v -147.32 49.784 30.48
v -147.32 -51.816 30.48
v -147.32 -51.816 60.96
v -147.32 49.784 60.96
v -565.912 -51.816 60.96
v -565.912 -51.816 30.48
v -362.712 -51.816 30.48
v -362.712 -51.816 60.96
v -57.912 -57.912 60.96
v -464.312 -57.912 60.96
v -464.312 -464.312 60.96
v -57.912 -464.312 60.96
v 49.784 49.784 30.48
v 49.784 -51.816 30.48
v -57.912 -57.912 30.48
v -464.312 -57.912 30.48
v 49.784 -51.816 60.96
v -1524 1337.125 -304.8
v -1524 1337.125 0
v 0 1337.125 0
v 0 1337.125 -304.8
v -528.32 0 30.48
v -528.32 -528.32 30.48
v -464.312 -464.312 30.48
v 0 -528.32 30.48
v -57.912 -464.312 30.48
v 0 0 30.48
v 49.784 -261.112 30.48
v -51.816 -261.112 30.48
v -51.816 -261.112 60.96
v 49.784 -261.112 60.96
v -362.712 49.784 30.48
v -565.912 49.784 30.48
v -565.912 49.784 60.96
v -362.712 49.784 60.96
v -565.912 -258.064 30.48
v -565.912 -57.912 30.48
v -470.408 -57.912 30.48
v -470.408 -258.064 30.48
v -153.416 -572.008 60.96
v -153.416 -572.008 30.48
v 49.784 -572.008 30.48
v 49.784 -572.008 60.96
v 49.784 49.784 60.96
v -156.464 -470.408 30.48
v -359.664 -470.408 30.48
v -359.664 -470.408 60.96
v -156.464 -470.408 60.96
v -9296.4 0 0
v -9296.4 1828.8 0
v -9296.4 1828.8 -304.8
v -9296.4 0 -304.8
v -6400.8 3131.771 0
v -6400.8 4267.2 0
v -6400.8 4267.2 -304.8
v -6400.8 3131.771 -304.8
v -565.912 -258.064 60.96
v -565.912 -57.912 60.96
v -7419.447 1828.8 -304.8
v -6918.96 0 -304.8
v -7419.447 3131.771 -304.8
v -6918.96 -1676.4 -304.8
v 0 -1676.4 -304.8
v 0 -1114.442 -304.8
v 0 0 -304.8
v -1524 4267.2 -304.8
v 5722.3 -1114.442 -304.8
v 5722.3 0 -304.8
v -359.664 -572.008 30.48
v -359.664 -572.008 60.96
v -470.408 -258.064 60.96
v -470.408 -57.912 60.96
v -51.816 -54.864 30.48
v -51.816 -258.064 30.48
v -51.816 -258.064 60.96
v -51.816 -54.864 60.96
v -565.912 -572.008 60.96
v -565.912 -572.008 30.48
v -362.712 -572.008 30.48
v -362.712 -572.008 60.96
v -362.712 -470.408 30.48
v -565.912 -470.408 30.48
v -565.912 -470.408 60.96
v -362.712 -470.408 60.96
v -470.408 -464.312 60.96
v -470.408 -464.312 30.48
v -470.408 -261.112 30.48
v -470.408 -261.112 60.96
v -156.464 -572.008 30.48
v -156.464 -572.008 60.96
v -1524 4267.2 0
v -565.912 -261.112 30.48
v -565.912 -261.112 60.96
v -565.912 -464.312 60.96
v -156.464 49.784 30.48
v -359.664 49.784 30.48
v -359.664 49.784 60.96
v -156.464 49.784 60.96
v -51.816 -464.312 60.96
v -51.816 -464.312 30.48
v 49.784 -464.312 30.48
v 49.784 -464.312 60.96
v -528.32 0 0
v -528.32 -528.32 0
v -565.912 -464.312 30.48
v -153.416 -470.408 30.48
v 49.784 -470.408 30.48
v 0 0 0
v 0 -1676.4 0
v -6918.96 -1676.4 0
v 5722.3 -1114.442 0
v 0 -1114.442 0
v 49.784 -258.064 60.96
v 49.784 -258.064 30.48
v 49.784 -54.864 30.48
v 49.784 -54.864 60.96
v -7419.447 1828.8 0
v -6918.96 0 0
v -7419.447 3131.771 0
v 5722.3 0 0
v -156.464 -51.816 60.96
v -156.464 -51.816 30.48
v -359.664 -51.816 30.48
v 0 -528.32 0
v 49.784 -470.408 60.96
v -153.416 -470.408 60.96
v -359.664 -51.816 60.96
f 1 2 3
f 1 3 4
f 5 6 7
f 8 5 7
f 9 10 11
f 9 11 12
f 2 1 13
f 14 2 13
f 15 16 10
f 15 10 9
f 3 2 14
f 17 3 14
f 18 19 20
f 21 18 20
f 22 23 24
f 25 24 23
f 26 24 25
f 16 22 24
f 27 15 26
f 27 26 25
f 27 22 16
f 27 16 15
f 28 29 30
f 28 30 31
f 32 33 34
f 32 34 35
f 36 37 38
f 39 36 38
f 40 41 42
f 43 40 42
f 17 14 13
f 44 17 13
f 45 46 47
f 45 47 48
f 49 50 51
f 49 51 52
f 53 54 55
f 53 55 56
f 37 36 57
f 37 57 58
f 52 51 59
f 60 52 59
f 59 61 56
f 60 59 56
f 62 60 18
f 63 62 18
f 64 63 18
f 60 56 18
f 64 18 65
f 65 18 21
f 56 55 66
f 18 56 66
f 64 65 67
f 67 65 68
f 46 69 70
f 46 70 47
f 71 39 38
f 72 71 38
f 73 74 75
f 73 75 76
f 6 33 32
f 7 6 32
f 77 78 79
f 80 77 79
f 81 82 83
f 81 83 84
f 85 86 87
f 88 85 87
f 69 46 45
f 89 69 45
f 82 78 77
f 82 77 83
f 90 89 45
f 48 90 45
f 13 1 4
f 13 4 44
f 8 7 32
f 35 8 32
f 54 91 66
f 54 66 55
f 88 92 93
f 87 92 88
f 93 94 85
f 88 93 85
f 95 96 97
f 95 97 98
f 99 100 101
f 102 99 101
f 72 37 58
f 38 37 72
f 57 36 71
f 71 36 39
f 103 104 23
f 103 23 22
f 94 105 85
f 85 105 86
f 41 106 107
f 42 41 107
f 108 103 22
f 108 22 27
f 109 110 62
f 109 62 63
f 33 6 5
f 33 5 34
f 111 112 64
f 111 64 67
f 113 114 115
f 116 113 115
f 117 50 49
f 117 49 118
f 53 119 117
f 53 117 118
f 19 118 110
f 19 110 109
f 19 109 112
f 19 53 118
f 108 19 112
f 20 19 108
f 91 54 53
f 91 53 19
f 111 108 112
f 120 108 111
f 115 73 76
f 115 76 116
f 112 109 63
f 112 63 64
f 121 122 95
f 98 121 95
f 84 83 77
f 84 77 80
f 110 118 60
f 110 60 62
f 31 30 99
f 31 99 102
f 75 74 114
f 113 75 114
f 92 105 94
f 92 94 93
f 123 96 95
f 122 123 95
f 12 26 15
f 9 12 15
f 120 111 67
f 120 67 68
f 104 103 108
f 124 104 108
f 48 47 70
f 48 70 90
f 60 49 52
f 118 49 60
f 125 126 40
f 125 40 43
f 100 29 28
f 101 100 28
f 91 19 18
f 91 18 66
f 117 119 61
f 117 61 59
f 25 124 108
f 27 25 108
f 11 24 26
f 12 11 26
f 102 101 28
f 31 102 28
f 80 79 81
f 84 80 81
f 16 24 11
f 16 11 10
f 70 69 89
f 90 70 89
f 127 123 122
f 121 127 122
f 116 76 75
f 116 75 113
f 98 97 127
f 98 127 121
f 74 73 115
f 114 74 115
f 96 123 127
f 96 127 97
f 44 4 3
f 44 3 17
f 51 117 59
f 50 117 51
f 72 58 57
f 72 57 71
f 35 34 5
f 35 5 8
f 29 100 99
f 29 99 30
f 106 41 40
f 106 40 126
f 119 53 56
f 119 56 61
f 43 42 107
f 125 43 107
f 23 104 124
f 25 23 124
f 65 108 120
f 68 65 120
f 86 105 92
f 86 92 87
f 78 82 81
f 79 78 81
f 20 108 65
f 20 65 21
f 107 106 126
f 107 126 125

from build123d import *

# Parameters (mm, degrees)
F0_W     = 1524
F0_H     = 1337.124705
F0_W_2   = 5722.299576
F0_H_2   = 1114.441872
F1_DEPTH = 304.8
F2_W     = 528.32
F2_H     = 528.32
F3_DEPTH = 30.48
F4_W     = 406.4
F4_H     = 406.4
F5_DEPTH = 30.48
F6_W     = 203.2
F6_H     = 101.6
F6_W_2   = 101.6
F6_H_2   = 203.2
F6_W_3   = 197.104
F6_W_4   = 95.504
F6_H_3   = 200.152
F7_DEPTH = 30.48


with BuildPart() as f1:
    # F0 (on Top) → F1 (new body)
    with BuildSketch(Plane.XY):
        Polygon((-9296.4, 0), (-6918.96, 0), (-1524, 0), (-1524, 1337.124705), (-1524, 4267.2), (-6400.8, 4267.2), (-6400.8, 3131.770648), (-7419.447352, 3131.770648), (-7419.447352, 1828.8), (-9296.4, 1828.8), align=None)
        Polygon((-1524, 0), (-6918.96, 0), (-6918.96, -1676.4), (0, -1676.4), (0, -1114.441872), (0, 0), align=None)
        with Locations((-762, 668.562352)):
            Rectangle(F0_W, F0_H)
        with Locations((2861.149788, -557.220936)):
            Rectangle(F0_W_2, F0_H_2)
    extrude(amount=-F1_DEPTH)


with BuildPart() as f3:
    # F2 (on Top) → F3 (new body)
    with BuildSketch(Plane.XY):
        with Locations((-264.16, -264.16)):
            Rectangle(F2_W, F2_H)
    extrude(amount=F3_DEPTH)

    # F4 (on face) → F5 (join)
    with BuildSketch(Plane.XY.offset(30.48)):
        with Locations((-261.112, -261.112)):
            Rectangle(F4_W, F4_H)
    extrude(amount=F5_DEPTH)


with BuildPart() as f7:
    # F6 (on face) → F7 (new body)
    with BuildSketch(Plane.XY.offset(30.48)):
        with Locations((-51.816, -521.208)):
            Rectangle(F6_W, F6_H)
        with Locations((-258.064, -521.208)):
            Rectangle(F6_W, F6_H)
        with Locations((-1.016, -362.712)):
            Rectangle(F6_W_2, F6_H_2)
        with Locations((-1.016, -156.464)):
            Rectangle(F6_W_2, F6_H_2)
        with Locations((-464.312, -521.208)):
            Rectangle(F6_W, F6_H)
        with Locations((-48.768, -1.016)):
            Rectangle(F6_W_3, F6_H)
        with Locations((-258.064, -1.016)):
            Rectangle(F6_W, F6_H)
        with Locations((-518.16, -362.712)):
            Rectangle(F6_W_4, F6_H_2)
        with Locations((-518.16, -157.988)):
            Rectangle(F6_W_4, F6_H_3)
        with Locations((-464.312, -1.016)):
            Rectangle(F6_W, F6_H)
    extrude(amount=F7_DEPTH)


solid = Compound([f1.part, f3.part, f7.part])
